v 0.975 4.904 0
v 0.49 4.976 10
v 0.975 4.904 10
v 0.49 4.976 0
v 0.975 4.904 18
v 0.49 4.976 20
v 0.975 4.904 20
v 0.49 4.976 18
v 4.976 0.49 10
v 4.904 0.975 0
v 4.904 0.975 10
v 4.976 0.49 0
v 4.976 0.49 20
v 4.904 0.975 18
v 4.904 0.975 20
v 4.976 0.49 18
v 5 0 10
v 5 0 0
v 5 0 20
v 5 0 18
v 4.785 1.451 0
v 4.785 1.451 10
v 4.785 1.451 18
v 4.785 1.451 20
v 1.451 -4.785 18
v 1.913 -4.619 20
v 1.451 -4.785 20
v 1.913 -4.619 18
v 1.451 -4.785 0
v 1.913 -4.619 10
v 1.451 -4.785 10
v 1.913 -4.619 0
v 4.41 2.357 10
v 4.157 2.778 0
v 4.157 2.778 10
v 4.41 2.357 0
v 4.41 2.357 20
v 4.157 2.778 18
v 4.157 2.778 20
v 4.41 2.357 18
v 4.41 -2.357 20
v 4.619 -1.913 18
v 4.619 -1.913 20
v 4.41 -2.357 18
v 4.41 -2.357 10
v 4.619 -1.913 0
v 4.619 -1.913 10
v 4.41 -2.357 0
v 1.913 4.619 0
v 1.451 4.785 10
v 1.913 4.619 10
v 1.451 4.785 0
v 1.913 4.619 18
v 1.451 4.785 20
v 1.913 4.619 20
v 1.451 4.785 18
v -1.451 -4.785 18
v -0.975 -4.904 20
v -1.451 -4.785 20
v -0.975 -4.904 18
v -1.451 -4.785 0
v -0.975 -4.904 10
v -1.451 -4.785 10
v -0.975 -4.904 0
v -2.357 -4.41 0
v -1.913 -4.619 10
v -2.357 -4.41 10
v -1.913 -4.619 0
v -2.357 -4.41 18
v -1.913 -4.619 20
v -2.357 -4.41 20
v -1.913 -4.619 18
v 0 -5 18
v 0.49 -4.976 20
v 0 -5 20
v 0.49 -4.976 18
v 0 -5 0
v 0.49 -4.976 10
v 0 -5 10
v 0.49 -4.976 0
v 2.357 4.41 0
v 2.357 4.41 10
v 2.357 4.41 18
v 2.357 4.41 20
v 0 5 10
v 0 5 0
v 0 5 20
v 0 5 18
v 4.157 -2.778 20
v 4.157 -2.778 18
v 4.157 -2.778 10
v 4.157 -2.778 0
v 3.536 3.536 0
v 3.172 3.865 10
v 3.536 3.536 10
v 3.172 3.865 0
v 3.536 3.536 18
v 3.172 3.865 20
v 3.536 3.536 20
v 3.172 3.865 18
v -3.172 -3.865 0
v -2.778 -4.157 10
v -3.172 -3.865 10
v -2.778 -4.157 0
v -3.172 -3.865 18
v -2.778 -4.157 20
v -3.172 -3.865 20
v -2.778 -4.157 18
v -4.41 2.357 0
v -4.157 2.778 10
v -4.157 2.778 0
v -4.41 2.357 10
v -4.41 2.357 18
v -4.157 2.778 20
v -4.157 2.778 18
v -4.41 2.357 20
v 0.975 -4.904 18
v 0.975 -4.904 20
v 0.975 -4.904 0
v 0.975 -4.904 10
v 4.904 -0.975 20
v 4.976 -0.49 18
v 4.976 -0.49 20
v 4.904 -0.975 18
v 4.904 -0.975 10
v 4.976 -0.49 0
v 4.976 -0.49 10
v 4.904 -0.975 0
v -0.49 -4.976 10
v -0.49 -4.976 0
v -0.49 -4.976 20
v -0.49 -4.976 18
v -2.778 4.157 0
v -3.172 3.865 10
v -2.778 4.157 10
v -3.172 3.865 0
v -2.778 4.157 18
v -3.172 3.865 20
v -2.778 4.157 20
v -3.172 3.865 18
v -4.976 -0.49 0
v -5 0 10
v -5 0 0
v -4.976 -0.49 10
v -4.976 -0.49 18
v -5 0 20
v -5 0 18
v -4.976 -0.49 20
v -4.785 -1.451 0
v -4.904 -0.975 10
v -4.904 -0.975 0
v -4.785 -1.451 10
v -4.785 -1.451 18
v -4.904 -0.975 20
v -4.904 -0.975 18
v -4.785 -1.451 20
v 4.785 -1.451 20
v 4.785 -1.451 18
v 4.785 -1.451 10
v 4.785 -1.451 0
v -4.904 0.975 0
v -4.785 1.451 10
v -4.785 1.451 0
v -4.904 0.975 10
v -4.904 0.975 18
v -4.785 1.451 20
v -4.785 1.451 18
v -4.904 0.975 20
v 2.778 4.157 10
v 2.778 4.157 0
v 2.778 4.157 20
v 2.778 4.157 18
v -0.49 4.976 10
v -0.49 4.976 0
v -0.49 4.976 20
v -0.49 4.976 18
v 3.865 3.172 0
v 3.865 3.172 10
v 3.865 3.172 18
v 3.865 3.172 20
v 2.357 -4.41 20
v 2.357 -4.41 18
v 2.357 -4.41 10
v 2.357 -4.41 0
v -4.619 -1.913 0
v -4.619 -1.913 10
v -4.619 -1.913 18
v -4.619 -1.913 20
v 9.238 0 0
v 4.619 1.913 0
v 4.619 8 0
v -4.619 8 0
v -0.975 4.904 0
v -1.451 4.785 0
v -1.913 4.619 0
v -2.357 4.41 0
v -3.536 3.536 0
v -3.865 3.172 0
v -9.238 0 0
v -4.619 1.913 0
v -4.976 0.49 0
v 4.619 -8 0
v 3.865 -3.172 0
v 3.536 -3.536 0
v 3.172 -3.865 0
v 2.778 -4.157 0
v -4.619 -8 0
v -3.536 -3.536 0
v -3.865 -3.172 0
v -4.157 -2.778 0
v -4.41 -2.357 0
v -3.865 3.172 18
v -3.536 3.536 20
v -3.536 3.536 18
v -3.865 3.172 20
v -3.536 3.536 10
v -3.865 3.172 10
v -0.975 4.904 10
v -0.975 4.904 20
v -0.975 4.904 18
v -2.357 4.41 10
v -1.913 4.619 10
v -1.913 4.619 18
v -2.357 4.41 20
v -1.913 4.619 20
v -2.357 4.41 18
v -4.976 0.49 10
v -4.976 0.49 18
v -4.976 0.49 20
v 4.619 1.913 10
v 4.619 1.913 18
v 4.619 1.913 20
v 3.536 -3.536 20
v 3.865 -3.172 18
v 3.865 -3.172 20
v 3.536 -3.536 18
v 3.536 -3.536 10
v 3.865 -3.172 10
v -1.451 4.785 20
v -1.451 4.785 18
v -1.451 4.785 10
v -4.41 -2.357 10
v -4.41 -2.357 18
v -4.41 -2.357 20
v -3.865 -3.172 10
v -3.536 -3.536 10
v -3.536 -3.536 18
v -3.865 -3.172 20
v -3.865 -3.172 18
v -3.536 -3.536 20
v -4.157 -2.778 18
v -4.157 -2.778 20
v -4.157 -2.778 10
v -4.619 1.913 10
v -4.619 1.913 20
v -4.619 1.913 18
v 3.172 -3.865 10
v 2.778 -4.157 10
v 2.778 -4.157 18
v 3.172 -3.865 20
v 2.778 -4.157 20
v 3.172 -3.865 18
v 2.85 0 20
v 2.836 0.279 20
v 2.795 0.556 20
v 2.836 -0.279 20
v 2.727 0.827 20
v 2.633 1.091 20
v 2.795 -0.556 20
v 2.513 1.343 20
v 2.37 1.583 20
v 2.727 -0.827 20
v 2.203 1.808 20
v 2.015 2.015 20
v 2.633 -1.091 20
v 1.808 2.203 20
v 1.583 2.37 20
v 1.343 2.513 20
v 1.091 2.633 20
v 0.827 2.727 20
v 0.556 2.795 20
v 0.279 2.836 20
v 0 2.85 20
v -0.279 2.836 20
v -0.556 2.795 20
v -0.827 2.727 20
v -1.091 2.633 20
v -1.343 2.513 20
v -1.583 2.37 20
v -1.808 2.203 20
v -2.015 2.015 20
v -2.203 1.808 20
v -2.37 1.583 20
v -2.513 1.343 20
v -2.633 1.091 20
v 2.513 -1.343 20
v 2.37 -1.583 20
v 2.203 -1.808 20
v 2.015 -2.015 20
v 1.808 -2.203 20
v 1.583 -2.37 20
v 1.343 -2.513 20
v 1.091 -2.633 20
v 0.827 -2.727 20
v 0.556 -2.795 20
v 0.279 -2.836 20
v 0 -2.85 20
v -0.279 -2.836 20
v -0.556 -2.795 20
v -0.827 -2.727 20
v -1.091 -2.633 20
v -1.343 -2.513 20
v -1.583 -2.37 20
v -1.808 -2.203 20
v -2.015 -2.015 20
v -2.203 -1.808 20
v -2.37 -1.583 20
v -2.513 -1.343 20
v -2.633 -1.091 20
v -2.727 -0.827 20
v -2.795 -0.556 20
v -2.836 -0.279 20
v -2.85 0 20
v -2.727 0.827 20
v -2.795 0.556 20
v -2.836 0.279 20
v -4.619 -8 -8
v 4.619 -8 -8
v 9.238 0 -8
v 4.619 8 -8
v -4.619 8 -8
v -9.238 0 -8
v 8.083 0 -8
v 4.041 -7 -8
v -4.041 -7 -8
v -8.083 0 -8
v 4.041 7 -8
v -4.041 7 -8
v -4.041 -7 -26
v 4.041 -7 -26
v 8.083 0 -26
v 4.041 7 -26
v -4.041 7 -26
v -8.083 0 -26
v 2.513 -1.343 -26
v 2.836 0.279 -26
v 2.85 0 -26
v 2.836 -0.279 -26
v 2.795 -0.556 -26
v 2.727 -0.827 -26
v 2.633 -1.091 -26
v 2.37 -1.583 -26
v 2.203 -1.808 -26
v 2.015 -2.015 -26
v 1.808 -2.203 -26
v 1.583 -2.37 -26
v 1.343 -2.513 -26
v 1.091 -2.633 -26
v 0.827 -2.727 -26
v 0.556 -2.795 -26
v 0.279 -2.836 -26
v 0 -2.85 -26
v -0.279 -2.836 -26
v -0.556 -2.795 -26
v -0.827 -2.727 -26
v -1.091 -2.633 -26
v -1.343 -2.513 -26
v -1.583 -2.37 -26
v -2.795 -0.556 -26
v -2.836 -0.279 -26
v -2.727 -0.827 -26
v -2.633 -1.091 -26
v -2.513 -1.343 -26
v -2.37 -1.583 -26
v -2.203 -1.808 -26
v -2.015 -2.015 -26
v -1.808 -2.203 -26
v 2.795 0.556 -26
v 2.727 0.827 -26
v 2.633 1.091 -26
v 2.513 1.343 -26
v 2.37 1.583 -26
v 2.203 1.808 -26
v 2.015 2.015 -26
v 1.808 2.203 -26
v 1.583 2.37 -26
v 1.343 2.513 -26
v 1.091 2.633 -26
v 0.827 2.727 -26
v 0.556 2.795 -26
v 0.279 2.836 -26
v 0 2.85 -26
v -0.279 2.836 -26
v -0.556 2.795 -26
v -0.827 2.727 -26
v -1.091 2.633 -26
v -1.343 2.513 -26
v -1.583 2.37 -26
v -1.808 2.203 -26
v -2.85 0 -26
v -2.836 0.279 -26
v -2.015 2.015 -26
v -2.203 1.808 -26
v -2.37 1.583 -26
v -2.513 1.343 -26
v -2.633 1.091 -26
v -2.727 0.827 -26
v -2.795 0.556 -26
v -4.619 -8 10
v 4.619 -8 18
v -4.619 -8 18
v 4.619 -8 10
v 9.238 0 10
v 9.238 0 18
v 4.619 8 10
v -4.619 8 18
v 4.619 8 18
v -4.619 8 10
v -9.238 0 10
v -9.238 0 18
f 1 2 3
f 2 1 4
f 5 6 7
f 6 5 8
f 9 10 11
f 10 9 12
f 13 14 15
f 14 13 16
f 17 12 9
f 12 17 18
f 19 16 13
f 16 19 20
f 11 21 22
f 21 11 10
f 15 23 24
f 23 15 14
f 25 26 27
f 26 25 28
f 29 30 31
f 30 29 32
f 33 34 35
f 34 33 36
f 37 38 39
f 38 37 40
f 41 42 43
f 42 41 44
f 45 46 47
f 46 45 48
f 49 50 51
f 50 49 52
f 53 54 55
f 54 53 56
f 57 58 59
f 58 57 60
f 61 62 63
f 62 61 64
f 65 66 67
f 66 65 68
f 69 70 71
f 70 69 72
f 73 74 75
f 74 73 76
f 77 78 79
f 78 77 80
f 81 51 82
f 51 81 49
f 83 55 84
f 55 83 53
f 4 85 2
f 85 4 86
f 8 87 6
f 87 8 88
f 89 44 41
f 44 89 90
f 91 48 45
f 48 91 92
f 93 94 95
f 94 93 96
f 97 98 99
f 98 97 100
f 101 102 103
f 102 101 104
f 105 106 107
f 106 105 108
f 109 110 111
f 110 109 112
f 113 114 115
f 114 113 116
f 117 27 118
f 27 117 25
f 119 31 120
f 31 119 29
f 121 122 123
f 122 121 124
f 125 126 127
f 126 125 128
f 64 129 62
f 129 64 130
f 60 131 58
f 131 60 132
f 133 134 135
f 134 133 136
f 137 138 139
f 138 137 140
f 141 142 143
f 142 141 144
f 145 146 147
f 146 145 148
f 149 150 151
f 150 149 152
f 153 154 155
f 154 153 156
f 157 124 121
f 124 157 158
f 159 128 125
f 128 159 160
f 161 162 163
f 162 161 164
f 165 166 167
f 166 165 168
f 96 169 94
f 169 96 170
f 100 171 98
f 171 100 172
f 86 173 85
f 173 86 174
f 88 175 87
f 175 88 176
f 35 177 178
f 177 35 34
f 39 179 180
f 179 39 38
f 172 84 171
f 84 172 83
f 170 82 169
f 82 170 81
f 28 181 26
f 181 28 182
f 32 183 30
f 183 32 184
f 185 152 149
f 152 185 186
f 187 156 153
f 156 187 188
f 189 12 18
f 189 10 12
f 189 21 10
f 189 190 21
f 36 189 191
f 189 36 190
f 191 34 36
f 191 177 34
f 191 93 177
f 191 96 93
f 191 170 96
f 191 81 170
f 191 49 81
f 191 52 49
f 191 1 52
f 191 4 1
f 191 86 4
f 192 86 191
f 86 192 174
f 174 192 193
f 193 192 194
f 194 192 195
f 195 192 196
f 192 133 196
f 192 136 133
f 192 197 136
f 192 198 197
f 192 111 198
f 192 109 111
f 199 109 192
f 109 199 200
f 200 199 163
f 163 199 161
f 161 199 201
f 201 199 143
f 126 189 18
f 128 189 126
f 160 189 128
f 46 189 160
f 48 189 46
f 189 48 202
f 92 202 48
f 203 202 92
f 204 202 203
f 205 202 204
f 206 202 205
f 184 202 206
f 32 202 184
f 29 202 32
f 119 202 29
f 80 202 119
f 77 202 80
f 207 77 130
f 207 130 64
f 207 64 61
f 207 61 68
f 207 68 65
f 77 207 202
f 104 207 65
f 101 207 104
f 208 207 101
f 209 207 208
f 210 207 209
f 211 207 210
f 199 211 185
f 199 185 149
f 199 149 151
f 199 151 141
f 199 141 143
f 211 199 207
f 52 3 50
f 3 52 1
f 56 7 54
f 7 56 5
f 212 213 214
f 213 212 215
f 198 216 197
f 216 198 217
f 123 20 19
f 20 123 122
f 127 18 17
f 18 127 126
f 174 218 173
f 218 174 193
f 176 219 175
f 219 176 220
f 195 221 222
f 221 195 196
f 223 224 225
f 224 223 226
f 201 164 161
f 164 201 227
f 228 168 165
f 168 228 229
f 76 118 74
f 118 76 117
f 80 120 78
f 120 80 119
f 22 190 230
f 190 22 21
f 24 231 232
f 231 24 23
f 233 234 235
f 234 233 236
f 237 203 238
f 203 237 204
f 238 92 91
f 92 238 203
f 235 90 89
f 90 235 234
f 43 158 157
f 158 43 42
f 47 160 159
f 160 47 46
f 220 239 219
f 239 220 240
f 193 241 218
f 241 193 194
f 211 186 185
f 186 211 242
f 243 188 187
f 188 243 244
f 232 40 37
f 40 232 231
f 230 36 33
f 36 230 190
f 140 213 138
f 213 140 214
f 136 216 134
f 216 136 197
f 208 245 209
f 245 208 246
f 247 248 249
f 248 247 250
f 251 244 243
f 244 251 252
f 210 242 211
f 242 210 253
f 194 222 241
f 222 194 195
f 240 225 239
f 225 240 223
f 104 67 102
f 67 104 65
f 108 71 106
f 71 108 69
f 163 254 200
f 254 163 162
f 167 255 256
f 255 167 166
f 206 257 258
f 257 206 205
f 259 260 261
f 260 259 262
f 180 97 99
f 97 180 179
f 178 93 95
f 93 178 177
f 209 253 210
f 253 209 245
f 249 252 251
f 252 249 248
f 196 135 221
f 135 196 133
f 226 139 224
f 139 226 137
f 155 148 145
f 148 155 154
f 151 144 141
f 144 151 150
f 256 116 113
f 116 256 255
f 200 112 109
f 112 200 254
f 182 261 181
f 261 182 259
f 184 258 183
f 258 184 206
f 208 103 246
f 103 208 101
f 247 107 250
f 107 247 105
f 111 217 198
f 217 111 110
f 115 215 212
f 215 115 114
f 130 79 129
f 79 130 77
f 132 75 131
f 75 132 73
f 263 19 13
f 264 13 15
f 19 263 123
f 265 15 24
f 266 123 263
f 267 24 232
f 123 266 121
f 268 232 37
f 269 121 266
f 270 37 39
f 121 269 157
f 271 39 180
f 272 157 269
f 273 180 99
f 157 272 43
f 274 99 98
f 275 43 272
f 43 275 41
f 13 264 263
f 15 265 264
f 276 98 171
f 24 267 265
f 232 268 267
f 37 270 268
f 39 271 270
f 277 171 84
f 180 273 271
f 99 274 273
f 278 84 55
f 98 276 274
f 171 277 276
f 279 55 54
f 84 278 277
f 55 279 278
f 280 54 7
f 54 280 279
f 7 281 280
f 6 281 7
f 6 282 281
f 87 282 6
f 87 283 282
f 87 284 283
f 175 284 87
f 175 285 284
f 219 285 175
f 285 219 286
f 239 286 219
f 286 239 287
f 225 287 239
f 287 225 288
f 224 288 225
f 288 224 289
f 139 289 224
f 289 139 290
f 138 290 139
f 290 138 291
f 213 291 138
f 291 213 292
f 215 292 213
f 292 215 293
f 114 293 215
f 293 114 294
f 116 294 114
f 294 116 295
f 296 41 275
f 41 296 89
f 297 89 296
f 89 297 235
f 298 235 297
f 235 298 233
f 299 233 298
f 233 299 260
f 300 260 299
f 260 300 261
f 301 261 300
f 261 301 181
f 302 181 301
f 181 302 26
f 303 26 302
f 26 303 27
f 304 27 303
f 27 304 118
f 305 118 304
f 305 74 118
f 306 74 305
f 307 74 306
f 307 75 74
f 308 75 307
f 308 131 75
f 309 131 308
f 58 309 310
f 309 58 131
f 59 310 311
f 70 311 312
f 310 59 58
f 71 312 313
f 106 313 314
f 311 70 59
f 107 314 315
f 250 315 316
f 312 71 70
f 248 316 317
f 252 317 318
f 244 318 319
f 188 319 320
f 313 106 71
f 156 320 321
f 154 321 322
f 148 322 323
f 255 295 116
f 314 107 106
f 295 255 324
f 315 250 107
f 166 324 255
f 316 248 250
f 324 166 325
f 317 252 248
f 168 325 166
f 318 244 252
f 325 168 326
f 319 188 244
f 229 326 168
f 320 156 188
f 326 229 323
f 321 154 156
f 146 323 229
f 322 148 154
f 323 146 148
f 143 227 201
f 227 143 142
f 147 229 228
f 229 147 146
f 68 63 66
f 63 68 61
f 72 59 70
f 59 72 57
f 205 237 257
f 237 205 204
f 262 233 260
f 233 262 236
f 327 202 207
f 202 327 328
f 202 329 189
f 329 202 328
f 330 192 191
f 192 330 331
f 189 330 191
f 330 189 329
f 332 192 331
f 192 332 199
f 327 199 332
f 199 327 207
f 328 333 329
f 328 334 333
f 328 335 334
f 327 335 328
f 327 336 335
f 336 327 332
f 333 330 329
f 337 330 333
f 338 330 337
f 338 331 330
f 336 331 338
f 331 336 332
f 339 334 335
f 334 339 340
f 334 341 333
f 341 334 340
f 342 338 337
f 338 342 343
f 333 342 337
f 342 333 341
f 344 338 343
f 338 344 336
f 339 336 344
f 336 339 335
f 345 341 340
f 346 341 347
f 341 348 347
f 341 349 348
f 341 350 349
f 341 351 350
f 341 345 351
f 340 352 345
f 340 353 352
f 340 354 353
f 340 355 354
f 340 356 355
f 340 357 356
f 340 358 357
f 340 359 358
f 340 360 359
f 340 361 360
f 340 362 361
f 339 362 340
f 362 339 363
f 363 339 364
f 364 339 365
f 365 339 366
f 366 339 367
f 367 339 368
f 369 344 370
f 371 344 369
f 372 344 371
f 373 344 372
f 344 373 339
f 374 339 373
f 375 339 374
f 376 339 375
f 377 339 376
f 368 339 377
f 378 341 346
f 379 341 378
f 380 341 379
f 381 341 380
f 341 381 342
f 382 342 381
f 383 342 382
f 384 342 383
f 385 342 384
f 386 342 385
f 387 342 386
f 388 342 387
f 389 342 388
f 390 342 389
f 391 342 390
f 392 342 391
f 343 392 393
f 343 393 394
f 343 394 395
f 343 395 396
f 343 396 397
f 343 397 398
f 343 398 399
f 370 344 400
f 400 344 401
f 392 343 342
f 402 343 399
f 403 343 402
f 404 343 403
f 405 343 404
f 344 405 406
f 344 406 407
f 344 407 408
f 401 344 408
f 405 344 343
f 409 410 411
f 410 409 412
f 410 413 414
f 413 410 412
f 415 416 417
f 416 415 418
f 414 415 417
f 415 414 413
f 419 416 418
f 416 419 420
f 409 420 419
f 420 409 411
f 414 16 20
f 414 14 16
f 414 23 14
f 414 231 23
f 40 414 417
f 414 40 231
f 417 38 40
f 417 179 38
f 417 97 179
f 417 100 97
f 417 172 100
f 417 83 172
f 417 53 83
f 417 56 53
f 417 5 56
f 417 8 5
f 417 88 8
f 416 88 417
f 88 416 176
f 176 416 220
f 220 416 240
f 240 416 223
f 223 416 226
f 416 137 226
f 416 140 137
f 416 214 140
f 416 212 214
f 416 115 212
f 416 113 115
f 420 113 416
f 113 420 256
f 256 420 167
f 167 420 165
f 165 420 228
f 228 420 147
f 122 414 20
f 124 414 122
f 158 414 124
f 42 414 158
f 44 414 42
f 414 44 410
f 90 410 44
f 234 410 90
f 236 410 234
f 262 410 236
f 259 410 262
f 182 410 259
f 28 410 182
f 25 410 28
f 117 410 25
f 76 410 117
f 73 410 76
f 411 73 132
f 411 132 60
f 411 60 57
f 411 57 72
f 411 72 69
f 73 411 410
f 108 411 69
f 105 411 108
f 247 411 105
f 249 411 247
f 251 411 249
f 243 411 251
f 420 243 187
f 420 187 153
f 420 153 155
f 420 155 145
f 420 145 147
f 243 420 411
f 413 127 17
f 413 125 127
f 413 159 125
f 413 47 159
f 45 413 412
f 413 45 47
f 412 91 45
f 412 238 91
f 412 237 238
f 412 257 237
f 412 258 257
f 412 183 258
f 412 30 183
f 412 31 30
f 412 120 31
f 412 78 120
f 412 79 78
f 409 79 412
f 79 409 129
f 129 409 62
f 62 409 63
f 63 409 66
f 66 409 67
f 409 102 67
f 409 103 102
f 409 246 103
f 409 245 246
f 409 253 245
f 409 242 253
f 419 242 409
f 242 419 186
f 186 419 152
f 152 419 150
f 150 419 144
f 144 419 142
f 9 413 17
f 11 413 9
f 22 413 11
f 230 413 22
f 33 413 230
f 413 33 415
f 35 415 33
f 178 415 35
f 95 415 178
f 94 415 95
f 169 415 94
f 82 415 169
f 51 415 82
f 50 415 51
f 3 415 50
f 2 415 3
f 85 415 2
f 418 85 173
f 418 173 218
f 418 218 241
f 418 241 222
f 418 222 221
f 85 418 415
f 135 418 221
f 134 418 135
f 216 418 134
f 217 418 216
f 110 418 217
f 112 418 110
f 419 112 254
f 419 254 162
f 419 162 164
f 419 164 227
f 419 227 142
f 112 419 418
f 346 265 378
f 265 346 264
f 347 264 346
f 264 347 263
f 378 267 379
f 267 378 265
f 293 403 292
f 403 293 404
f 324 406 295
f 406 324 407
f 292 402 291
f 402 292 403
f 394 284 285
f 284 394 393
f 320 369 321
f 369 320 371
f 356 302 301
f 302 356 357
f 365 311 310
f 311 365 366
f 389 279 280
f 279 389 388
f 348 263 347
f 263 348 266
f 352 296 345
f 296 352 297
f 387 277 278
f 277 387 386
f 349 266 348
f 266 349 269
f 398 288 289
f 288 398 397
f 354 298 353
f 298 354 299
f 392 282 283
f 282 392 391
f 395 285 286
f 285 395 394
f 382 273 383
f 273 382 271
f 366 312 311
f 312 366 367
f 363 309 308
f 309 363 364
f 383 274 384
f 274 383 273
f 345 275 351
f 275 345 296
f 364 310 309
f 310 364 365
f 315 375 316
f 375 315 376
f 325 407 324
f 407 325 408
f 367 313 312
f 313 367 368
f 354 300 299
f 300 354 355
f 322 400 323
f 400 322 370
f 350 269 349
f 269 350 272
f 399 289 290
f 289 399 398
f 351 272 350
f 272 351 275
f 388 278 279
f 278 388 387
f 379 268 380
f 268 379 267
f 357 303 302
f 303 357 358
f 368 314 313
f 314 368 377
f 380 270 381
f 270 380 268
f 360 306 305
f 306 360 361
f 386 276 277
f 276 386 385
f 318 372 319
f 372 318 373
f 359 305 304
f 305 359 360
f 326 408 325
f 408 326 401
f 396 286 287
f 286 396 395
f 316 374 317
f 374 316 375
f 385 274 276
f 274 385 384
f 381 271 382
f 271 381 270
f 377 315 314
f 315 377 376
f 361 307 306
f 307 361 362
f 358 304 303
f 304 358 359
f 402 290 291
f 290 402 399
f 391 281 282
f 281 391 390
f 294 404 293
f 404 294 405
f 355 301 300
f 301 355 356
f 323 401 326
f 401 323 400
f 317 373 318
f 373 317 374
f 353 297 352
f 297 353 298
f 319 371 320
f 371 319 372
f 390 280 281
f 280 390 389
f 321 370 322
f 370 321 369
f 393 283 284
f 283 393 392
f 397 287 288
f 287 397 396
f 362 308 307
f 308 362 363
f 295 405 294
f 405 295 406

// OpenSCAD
// Child endcap envelope: local Z0 = outside face; +Z = dry side.
// M10 thread20, nutAF16/h8 per official WLP datasheet v1.5.
// Outside head/plug split is illustrative; total envelope uses upper limit26.
$fn=64;
module hex(af,h){cylinder(d=af/cos(30),h=h,$fn=6);}
difference(){
 union(){
  cylinder(d=10,h=20);
  translate([0,0,-8]) hex(16,8);
  translate([0,0,-26]) hex(14,18);
  translate([0,0,10]) hex(16,8);
 }
 translate([0,0,-27]) cylinder(d=5.7,h=48);
}
